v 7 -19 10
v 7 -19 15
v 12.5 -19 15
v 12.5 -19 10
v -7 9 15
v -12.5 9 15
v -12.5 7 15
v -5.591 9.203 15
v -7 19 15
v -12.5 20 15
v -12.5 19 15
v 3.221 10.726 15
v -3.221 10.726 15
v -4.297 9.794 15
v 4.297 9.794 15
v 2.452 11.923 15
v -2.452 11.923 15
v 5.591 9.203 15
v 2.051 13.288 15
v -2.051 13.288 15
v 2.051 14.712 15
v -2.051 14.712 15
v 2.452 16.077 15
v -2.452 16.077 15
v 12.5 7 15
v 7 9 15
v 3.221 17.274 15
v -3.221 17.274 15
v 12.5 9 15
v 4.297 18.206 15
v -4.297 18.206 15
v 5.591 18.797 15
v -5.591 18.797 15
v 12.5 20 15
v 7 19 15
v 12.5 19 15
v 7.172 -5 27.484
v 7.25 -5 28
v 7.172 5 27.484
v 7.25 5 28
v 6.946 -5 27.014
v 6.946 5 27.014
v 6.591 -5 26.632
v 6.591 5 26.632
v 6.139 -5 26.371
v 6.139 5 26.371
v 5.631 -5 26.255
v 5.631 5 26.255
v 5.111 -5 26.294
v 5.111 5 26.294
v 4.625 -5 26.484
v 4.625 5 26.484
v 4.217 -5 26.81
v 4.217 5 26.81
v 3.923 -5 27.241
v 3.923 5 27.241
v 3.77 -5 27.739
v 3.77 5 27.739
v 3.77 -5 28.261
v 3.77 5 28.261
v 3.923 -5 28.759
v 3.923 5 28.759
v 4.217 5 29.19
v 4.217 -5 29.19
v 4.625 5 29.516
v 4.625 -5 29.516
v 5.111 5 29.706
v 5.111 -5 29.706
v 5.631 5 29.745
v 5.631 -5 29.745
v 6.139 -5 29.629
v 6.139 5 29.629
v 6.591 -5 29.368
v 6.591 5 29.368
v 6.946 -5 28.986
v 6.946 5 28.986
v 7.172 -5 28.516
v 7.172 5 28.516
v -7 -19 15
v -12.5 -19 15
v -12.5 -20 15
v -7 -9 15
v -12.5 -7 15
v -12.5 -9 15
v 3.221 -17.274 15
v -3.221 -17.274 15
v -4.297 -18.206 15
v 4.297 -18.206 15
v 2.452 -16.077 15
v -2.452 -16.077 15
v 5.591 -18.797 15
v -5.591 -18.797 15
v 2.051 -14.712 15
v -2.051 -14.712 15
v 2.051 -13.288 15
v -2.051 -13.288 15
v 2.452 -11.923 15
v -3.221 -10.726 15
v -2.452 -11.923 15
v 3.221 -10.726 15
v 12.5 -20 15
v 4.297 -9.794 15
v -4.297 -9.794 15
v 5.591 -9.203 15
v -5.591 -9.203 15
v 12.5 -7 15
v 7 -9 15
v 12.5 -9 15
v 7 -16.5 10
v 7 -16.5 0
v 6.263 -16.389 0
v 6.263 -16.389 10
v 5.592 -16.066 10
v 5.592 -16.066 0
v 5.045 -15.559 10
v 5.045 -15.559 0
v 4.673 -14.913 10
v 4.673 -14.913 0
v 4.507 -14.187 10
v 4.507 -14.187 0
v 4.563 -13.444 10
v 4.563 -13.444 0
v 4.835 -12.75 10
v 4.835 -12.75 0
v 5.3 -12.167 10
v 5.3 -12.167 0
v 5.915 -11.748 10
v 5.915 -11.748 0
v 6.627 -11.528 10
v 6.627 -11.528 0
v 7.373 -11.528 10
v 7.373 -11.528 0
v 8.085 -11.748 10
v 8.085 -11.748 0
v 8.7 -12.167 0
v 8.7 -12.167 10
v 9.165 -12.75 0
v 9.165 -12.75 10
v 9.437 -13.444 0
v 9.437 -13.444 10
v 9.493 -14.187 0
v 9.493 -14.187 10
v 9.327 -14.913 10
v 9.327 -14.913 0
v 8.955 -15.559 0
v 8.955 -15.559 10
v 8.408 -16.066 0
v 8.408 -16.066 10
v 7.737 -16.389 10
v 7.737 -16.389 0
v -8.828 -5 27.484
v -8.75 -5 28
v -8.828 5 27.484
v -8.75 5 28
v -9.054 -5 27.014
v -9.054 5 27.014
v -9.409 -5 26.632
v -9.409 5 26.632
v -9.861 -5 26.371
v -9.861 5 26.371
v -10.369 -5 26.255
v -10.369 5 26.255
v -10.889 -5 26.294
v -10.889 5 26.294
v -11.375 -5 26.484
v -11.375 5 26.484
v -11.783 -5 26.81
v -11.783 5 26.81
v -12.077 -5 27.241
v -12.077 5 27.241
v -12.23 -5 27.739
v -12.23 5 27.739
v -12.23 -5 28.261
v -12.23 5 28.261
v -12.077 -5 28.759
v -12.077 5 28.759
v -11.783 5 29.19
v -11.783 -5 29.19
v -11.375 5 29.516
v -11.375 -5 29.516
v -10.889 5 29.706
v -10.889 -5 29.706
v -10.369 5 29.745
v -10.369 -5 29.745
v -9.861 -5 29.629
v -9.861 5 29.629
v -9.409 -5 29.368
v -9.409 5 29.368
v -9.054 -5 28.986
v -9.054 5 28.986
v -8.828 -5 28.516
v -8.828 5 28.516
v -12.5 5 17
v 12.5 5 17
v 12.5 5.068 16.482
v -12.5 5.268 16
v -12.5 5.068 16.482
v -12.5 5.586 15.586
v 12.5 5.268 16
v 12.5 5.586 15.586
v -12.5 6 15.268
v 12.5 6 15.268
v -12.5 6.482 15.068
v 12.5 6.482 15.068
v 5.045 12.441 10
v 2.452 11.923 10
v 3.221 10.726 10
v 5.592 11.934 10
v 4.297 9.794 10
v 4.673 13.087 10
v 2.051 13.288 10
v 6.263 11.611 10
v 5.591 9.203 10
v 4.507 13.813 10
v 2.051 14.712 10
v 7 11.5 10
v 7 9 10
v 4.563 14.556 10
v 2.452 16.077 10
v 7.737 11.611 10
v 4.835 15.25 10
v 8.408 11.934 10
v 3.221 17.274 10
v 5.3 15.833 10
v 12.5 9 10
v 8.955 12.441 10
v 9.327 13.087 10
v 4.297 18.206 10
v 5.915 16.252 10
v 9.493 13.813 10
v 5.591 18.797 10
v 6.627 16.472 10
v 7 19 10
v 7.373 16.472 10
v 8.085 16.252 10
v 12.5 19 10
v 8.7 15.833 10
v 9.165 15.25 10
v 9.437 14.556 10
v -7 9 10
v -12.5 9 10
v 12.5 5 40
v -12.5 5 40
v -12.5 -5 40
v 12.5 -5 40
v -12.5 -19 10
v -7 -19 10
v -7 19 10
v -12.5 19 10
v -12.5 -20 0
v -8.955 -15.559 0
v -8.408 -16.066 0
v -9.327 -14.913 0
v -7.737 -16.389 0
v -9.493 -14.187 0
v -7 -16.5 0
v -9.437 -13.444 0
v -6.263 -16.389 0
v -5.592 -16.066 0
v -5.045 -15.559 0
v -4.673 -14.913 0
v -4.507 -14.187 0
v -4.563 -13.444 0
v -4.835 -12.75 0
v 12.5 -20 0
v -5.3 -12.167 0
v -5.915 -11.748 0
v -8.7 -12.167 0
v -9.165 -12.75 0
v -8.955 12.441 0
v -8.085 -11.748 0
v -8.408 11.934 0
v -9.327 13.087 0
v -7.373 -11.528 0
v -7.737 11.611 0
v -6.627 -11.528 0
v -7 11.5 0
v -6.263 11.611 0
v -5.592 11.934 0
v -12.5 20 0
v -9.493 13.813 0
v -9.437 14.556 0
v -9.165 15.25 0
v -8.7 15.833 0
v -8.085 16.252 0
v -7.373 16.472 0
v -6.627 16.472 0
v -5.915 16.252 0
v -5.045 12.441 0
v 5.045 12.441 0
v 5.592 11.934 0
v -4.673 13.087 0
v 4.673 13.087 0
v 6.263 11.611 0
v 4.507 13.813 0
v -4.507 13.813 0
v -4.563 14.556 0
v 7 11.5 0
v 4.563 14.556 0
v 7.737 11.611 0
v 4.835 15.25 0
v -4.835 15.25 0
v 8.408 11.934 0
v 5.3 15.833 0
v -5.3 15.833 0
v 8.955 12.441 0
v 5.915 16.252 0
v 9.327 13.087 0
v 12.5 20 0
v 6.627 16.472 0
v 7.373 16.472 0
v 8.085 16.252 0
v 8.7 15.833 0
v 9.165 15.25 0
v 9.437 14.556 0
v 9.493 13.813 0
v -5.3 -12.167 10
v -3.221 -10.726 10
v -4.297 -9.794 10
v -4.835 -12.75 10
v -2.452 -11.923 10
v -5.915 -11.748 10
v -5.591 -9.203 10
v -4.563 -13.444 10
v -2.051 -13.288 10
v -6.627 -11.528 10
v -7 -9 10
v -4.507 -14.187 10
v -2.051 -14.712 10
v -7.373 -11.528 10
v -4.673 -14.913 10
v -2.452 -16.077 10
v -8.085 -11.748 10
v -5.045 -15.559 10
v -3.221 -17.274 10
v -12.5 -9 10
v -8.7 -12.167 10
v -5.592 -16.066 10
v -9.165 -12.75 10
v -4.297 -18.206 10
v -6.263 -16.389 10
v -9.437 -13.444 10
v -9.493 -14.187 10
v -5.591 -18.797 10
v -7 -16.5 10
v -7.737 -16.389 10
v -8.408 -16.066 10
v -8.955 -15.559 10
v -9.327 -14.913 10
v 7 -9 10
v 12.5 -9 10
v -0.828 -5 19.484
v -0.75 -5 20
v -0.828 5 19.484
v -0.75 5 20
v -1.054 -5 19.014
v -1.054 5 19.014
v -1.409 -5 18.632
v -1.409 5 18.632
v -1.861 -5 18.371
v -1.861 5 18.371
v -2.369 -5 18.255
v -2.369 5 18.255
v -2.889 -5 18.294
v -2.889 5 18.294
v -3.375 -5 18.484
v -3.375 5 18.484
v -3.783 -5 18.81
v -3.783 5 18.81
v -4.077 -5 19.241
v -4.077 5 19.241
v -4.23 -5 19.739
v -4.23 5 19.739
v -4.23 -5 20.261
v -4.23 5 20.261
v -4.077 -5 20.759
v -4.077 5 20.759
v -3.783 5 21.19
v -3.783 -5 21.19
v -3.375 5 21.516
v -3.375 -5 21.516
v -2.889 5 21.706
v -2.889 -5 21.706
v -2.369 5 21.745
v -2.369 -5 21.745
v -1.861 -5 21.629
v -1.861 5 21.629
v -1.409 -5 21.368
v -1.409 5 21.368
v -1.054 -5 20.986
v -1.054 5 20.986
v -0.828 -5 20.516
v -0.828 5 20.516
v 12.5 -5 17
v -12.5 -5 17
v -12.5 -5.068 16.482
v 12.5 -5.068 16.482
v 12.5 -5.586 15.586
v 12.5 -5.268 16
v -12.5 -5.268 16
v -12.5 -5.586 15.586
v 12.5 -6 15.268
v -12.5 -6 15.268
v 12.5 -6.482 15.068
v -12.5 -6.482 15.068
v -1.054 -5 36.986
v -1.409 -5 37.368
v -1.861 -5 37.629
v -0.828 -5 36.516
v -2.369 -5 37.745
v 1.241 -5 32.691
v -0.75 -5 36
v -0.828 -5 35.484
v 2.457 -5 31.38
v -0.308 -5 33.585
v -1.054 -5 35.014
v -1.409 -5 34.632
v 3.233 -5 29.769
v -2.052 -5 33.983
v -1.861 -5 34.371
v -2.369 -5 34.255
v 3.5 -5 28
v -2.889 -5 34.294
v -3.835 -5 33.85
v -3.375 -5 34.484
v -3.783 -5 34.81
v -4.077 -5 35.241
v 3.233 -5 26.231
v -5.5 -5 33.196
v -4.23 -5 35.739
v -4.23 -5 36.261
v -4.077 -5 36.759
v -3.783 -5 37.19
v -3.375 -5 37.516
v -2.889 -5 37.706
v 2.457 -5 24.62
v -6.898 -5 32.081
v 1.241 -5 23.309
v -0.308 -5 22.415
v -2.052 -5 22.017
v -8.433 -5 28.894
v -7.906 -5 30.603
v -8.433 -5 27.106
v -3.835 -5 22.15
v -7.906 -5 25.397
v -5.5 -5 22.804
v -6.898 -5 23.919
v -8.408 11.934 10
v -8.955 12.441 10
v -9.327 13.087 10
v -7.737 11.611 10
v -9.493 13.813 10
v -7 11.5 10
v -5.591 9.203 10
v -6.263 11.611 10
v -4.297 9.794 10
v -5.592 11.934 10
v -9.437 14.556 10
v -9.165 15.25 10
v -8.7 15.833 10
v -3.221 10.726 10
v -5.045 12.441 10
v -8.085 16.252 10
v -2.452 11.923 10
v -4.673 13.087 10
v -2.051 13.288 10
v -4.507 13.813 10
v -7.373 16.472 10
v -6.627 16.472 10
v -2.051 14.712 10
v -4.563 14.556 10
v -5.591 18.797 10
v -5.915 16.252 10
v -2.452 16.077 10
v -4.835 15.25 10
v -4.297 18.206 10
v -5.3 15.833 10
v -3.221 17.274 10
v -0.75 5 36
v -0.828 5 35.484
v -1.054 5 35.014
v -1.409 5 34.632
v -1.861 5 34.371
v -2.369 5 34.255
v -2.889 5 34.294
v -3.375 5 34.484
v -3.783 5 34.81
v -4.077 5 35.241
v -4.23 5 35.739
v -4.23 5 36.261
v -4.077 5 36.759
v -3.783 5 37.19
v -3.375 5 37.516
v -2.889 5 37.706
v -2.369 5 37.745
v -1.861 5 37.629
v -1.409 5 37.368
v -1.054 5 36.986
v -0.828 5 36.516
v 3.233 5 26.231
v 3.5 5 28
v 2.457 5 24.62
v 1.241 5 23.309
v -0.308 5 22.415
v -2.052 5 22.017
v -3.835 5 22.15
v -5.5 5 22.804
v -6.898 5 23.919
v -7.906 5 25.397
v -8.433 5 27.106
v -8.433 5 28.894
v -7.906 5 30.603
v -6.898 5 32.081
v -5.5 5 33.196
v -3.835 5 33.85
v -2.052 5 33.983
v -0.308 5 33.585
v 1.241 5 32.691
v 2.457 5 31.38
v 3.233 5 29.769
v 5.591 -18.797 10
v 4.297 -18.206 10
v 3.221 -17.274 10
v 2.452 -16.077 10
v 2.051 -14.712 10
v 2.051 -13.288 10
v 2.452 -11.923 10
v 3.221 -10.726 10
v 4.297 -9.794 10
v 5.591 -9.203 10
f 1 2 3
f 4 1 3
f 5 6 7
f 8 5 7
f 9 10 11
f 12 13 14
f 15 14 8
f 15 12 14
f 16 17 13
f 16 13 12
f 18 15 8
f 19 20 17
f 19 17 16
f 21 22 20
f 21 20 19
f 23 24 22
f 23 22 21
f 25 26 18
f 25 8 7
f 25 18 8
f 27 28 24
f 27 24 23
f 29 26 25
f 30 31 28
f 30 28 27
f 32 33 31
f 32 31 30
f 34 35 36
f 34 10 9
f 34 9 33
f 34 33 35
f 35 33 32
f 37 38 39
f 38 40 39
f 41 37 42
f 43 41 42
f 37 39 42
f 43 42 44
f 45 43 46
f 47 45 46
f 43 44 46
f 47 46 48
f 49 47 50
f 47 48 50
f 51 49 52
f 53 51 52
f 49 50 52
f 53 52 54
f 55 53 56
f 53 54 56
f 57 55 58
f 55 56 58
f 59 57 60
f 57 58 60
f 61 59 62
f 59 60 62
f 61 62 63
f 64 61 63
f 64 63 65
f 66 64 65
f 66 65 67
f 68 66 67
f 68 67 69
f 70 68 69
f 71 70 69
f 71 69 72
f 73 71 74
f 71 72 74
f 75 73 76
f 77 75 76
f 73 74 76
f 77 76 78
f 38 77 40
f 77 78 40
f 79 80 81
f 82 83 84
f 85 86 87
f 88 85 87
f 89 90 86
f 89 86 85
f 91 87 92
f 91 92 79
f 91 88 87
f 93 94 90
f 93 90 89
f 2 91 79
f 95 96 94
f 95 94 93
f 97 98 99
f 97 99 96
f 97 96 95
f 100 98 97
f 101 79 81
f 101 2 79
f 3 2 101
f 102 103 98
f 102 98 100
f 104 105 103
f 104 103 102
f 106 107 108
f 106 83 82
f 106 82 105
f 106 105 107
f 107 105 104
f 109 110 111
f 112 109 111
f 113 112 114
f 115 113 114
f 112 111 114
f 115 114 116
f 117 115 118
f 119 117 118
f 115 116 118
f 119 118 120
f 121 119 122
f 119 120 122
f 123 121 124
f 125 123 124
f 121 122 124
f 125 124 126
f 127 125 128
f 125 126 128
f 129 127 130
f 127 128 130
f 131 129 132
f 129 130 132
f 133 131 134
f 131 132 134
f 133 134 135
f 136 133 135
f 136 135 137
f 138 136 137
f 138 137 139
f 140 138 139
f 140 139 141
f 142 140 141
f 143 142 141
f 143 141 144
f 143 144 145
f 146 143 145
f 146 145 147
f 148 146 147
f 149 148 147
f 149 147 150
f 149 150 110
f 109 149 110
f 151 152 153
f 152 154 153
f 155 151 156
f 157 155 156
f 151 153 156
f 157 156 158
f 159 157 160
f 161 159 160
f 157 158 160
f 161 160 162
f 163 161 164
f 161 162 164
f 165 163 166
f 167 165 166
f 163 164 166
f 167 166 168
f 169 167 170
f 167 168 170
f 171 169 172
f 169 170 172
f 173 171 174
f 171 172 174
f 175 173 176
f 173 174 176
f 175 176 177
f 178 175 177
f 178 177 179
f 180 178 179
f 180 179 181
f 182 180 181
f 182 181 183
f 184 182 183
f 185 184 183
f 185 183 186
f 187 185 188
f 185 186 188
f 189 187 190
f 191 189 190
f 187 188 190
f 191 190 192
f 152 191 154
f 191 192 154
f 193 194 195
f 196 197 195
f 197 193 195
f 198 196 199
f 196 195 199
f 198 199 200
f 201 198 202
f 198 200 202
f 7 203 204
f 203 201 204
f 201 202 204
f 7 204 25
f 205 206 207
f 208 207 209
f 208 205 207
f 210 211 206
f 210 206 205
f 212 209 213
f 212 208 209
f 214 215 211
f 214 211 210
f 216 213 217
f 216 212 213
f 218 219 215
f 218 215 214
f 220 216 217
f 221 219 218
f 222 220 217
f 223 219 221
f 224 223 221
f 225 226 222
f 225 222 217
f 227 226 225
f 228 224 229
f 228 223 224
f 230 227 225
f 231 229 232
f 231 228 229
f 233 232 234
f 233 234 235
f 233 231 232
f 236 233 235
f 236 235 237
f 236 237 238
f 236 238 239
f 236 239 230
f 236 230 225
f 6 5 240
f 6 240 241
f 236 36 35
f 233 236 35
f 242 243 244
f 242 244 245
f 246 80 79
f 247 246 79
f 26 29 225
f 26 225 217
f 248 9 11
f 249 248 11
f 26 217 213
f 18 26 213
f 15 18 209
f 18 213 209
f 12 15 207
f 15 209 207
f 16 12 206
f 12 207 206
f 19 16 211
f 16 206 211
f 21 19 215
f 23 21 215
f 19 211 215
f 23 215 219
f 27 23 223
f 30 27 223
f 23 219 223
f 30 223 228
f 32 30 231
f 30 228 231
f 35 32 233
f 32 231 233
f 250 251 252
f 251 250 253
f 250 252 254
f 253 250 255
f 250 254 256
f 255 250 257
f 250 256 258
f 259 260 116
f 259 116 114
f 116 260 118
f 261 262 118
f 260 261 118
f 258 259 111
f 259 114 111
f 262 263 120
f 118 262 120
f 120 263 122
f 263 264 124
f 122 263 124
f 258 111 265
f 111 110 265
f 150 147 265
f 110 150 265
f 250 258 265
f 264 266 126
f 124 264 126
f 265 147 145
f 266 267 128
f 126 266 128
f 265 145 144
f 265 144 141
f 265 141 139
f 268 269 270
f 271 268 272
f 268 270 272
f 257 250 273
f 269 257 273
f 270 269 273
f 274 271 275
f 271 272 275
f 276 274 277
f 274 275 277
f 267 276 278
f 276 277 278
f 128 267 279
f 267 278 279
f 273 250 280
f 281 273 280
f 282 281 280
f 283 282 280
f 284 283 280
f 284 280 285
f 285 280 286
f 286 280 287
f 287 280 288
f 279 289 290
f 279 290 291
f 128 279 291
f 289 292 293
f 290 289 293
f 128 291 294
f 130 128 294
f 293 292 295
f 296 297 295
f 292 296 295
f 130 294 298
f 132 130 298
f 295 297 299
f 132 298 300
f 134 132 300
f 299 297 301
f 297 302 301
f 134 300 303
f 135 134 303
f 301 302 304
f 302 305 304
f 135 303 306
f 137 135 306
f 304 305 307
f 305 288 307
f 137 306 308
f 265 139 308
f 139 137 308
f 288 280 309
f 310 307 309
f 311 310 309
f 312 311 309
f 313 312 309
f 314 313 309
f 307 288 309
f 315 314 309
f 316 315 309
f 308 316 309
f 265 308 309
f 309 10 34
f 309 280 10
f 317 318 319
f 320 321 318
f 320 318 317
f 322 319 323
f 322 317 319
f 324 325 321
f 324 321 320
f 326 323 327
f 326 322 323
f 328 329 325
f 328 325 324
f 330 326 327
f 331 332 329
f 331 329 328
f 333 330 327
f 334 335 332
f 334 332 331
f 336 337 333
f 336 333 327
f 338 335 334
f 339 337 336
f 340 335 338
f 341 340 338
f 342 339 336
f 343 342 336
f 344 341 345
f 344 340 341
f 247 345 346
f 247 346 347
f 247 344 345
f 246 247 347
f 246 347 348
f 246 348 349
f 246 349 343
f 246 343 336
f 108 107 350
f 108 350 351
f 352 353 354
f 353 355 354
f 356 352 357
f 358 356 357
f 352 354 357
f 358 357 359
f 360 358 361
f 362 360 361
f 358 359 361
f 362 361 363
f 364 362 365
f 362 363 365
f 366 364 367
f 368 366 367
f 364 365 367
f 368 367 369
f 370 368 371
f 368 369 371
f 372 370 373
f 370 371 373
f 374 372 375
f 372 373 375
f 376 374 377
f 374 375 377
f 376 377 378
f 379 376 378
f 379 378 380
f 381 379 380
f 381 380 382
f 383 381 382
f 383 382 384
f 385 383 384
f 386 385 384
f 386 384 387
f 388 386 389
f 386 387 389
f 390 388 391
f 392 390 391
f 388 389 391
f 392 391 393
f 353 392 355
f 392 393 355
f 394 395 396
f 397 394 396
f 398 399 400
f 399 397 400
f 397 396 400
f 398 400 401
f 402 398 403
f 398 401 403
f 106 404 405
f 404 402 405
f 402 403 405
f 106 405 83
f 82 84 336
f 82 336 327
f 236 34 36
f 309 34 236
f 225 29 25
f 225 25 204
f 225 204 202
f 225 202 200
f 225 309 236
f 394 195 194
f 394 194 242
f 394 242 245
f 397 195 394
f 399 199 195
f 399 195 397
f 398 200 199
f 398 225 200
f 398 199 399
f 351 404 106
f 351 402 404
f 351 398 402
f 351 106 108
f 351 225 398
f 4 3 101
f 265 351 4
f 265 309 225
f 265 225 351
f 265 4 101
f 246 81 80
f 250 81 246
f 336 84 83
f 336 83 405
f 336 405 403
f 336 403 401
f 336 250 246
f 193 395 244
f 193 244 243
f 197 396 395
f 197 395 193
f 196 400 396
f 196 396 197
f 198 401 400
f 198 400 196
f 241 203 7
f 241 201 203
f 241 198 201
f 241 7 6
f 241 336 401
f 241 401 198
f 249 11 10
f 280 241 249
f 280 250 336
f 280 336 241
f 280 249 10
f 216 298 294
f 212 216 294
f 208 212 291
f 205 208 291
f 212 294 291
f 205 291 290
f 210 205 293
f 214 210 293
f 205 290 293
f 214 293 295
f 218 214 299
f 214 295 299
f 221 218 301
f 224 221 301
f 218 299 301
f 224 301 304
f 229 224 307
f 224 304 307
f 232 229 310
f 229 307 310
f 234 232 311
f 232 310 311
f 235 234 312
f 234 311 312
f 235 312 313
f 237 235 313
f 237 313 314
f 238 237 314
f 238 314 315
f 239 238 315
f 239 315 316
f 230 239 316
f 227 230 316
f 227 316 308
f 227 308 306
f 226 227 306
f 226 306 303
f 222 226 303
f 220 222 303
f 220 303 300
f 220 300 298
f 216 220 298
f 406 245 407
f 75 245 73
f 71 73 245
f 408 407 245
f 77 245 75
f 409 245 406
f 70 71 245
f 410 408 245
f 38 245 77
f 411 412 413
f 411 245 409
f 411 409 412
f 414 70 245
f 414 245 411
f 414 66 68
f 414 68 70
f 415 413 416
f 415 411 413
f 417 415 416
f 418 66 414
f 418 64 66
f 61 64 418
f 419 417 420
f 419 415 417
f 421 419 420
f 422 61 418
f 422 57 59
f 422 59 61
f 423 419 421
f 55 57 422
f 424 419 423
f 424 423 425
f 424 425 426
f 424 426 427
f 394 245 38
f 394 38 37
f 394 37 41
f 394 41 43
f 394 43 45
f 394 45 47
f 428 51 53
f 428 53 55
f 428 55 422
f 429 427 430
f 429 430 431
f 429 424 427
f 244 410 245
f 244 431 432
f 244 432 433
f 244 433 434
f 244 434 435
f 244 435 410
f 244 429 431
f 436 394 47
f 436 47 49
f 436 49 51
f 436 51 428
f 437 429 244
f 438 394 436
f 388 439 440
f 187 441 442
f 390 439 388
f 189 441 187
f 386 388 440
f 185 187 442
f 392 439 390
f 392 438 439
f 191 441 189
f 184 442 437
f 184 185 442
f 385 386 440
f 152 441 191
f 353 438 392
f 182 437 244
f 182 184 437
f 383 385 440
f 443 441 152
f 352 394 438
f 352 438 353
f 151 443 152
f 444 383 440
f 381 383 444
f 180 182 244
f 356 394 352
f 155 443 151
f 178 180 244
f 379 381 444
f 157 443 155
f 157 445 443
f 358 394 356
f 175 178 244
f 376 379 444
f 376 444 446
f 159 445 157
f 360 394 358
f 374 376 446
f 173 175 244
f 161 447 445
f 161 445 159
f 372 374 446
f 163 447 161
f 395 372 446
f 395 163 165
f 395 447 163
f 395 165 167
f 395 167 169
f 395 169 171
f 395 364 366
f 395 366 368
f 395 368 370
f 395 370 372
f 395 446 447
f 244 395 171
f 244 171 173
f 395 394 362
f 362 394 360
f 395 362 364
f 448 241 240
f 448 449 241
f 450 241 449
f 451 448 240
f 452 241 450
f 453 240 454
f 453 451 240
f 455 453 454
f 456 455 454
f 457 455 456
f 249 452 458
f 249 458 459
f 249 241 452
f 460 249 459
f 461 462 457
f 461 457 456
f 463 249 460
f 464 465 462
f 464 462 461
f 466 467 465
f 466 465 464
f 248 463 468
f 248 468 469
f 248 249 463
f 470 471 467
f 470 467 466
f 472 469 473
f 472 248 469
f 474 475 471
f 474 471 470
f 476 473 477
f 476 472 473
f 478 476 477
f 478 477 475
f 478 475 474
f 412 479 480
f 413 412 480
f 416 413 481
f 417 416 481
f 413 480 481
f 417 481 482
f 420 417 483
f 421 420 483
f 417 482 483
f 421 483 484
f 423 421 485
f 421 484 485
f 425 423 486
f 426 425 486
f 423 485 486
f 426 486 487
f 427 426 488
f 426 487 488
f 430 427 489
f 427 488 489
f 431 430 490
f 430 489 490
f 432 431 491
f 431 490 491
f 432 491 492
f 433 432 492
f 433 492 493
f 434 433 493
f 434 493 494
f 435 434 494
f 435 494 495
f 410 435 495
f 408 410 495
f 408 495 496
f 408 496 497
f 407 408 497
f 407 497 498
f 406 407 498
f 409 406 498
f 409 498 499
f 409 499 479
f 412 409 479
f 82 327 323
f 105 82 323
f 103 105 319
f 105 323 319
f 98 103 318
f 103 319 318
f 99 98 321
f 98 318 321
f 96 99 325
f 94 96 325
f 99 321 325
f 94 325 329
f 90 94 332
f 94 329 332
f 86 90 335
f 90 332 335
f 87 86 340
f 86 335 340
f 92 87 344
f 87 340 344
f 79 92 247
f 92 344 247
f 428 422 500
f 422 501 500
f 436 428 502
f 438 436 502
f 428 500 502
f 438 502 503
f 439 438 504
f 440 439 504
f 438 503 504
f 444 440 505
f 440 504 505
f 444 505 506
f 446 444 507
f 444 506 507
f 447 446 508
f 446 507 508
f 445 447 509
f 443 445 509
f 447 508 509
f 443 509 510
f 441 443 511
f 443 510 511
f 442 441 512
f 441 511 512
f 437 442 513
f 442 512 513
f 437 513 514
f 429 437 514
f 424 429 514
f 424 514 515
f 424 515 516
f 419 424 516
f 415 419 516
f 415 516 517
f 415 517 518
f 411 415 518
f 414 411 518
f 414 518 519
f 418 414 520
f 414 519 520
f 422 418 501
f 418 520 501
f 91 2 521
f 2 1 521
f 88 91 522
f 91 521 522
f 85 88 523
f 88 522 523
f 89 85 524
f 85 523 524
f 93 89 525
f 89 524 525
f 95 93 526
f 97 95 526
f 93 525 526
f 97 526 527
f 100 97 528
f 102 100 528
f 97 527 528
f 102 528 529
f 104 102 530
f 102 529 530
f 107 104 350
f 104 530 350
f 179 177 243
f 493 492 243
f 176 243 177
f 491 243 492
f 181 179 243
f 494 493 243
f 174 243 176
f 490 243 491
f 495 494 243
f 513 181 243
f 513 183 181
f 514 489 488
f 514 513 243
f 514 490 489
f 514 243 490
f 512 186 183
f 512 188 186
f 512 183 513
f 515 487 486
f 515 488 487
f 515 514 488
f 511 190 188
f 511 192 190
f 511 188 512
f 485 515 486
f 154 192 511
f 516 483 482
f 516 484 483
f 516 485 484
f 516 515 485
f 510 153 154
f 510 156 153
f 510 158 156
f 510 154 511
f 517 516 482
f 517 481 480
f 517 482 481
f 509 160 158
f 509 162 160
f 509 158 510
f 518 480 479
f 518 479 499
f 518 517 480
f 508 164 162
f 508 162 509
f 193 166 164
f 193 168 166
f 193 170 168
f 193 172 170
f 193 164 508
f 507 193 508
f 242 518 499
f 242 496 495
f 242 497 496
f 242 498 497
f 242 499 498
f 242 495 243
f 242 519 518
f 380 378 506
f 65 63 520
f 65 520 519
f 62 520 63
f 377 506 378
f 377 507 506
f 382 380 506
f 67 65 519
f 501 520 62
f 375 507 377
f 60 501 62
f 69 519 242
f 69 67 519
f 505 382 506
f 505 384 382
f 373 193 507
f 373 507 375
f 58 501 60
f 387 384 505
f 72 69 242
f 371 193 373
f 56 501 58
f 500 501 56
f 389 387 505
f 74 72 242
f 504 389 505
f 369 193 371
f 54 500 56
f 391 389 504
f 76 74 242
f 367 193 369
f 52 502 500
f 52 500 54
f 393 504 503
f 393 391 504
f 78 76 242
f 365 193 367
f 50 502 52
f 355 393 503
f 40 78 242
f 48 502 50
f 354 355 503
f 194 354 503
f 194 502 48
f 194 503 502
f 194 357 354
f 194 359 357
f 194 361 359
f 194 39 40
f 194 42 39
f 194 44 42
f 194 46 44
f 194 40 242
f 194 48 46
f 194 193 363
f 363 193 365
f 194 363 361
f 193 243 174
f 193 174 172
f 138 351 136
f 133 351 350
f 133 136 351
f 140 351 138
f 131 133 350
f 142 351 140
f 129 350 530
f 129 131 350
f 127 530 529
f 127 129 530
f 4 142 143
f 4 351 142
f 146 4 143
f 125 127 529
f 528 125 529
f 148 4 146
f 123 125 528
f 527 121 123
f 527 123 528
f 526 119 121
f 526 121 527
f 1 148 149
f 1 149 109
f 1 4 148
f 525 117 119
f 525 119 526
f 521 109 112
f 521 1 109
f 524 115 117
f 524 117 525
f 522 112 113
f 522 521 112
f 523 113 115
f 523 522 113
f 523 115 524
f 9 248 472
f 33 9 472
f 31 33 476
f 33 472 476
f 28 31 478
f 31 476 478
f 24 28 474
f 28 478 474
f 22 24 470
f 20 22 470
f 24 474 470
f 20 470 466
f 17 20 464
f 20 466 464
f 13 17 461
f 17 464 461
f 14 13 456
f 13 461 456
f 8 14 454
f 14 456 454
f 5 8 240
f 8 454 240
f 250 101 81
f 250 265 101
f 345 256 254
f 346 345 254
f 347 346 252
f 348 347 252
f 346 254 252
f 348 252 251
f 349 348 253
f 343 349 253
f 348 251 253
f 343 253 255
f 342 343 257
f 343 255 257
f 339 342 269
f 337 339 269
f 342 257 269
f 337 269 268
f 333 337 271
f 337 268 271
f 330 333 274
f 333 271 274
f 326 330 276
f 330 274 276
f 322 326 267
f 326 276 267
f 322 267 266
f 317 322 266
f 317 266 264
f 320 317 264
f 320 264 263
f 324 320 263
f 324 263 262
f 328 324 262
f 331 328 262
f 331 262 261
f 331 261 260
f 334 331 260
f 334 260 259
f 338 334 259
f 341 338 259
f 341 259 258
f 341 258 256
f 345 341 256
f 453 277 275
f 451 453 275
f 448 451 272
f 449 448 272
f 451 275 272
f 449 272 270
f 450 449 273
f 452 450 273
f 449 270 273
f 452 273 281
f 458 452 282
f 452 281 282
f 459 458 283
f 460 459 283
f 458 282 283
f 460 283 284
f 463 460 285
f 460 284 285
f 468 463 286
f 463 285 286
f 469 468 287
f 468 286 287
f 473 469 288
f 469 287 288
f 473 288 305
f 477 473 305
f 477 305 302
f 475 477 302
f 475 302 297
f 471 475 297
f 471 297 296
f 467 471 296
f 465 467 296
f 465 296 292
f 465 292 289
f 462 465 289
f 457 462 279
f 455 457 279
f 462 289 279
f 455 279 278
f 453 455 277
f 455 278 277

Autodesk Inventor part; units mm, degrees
ref_plane "YZ Plane" through (0, 0, 0) normal (1, 0, 0) x (0, 1, 0)
ref_plane "XZ Plane" through (0, 0, 0) normal (0, 1, 0) x (-1, 0, 0)
ref_plane "XY Plane" through (0, 0, 0) normal (0, 0, 1) x (1, 0, 0)
sketch "Sketch1" plane through (0, 0, 0) normal (0, 0, 1) x (1, 0, 0)
  line L0 (-12.5, 20) -> (12.5, 20)
  line L1 (12.5, 20) -> (12.5, -20)
  line L2 (12.5, -20) -> (-12.5, -20)
  line L3 (-12.5, -20) -> (-12.5, 20)
  point P0 (0, 0)
  point P1 (-12.5, 0)
  point P2 (0, 20)
  dimension "d0" = 40
  dimension "d1" = 25
extrude "Extrusion1" add sketch "Sketch1" along normal blind 15
sketch "Sketch3" plane through (0, 0, 15) normal (0, 0, -1) x (-1, 0, 0)
  line L0 (-12.5, -20) -> (-12.5, 20) projected
  line L1 (-12.5, -20) -> (-12.5, 20) projected
  line L2 (12.5, -20) -> (-12.5, -20) projected
  line L3 (-12.5, 20) -> (12.5, 20) projected
  line L4 (0, 0) -> (0, 4.9357) construction
  point P0 (-7, -14)
  point P1 (-7, 14)
  point P2 (0, -20)
  point P3 (0, 20)
  point P4 (7, -14)
  point P5 (7, 14)
  dimension "d21" = 6
  dimension "d22" = 6
  dimension "d24" = 5.5
hole "Hole1" at (7, -14, 15) at (-7, -14, 15) at (-7, 14, 15) at (7, 14, 15) direction (0, 0, -1) diameter 5 end through all counterbore diameter 10 counterbore depth 5
sketch "Sketch4" plane through (0, 0, 15) normal (0, 0, 1) x (1, 0, 0)
  line L0 (-12.5, 5) -> (12.5, 5)
  line L1 (12.5, 5) -> (12.5, -5)
  line L2 (12.5, -5) -> (-12.5, -5)
  line L3 (-12.5, -5) -> (-12.5, 5)
  line L4 (12.5, -20) -> (12.5, 20) projected
  line L5 (-12.5, 20) -> (-12.5, -20) projected
  point P0 (0, 0)
  point P1 (12.5, 0)
  dimension "d20" = 10
extrude "Extrusion3" add sketch "Sketch4" along normal blind 25
sketch "Sketch5" plane through (-12.5, 5, 15) normal (0, 1, 0) x (1, 0, 0)
  circle A0 centre (10, -13) radius 6
  line L0 (25, -25) -> (0, -25) projected
  line L1 (25, 0) -> (25, -25) projected
  circle A1 centre (10, -5) radius 1.75
  circle A2 centre (2, -13) radius 1.75
  circle A3 centre (10, -21) radius 1.75
  circle A4 centre (18, -13) radius 1.75
  point P0 (12.5, 15)
  dimension "d27" = 12
  dimension "d28" = 12
  dimension "d29" = 15
  dimension "d30" = 3.5
  dimension "d31" = 8
  dimension "d34" = 360
extrude "Extrusion4" cut sketch "Sketch5" against normal through all
fillet "Fillet2" radius 2 2 edges at (0, 5, 15) (0, -5, 15)
sketch "Sketch6" plane through (0, 0, 15) normal (0, 0, 1) x (1, 0, 0)
  line L0 (12.5, 7) -> (12.5, 20) projected
  line L1 (12.5, 19) -> (7, 19)
  line L2 (12.5, 9) -> (7, 9)
  circle A0 centre (7, 14) radius 5 projected
  point P0 (0, 0)
extrude "Extrusion5" cut sketch "Sketch6" against normal up to surface (5 mm away) contours L2 A0 L1 L0
mirror "Mirror1" about plane through (0, 0, 0) normal (1, 0, 0) of "Extrusion5"
mirror "Mirror2" about plane through (0, 0, 0) normal (0, 1, 0) of "Extrusion5", "Mirror1"
equation "\"d22\" = d21"
properties part number "0008-10-013 Supăort Piulita Axa Z2"
